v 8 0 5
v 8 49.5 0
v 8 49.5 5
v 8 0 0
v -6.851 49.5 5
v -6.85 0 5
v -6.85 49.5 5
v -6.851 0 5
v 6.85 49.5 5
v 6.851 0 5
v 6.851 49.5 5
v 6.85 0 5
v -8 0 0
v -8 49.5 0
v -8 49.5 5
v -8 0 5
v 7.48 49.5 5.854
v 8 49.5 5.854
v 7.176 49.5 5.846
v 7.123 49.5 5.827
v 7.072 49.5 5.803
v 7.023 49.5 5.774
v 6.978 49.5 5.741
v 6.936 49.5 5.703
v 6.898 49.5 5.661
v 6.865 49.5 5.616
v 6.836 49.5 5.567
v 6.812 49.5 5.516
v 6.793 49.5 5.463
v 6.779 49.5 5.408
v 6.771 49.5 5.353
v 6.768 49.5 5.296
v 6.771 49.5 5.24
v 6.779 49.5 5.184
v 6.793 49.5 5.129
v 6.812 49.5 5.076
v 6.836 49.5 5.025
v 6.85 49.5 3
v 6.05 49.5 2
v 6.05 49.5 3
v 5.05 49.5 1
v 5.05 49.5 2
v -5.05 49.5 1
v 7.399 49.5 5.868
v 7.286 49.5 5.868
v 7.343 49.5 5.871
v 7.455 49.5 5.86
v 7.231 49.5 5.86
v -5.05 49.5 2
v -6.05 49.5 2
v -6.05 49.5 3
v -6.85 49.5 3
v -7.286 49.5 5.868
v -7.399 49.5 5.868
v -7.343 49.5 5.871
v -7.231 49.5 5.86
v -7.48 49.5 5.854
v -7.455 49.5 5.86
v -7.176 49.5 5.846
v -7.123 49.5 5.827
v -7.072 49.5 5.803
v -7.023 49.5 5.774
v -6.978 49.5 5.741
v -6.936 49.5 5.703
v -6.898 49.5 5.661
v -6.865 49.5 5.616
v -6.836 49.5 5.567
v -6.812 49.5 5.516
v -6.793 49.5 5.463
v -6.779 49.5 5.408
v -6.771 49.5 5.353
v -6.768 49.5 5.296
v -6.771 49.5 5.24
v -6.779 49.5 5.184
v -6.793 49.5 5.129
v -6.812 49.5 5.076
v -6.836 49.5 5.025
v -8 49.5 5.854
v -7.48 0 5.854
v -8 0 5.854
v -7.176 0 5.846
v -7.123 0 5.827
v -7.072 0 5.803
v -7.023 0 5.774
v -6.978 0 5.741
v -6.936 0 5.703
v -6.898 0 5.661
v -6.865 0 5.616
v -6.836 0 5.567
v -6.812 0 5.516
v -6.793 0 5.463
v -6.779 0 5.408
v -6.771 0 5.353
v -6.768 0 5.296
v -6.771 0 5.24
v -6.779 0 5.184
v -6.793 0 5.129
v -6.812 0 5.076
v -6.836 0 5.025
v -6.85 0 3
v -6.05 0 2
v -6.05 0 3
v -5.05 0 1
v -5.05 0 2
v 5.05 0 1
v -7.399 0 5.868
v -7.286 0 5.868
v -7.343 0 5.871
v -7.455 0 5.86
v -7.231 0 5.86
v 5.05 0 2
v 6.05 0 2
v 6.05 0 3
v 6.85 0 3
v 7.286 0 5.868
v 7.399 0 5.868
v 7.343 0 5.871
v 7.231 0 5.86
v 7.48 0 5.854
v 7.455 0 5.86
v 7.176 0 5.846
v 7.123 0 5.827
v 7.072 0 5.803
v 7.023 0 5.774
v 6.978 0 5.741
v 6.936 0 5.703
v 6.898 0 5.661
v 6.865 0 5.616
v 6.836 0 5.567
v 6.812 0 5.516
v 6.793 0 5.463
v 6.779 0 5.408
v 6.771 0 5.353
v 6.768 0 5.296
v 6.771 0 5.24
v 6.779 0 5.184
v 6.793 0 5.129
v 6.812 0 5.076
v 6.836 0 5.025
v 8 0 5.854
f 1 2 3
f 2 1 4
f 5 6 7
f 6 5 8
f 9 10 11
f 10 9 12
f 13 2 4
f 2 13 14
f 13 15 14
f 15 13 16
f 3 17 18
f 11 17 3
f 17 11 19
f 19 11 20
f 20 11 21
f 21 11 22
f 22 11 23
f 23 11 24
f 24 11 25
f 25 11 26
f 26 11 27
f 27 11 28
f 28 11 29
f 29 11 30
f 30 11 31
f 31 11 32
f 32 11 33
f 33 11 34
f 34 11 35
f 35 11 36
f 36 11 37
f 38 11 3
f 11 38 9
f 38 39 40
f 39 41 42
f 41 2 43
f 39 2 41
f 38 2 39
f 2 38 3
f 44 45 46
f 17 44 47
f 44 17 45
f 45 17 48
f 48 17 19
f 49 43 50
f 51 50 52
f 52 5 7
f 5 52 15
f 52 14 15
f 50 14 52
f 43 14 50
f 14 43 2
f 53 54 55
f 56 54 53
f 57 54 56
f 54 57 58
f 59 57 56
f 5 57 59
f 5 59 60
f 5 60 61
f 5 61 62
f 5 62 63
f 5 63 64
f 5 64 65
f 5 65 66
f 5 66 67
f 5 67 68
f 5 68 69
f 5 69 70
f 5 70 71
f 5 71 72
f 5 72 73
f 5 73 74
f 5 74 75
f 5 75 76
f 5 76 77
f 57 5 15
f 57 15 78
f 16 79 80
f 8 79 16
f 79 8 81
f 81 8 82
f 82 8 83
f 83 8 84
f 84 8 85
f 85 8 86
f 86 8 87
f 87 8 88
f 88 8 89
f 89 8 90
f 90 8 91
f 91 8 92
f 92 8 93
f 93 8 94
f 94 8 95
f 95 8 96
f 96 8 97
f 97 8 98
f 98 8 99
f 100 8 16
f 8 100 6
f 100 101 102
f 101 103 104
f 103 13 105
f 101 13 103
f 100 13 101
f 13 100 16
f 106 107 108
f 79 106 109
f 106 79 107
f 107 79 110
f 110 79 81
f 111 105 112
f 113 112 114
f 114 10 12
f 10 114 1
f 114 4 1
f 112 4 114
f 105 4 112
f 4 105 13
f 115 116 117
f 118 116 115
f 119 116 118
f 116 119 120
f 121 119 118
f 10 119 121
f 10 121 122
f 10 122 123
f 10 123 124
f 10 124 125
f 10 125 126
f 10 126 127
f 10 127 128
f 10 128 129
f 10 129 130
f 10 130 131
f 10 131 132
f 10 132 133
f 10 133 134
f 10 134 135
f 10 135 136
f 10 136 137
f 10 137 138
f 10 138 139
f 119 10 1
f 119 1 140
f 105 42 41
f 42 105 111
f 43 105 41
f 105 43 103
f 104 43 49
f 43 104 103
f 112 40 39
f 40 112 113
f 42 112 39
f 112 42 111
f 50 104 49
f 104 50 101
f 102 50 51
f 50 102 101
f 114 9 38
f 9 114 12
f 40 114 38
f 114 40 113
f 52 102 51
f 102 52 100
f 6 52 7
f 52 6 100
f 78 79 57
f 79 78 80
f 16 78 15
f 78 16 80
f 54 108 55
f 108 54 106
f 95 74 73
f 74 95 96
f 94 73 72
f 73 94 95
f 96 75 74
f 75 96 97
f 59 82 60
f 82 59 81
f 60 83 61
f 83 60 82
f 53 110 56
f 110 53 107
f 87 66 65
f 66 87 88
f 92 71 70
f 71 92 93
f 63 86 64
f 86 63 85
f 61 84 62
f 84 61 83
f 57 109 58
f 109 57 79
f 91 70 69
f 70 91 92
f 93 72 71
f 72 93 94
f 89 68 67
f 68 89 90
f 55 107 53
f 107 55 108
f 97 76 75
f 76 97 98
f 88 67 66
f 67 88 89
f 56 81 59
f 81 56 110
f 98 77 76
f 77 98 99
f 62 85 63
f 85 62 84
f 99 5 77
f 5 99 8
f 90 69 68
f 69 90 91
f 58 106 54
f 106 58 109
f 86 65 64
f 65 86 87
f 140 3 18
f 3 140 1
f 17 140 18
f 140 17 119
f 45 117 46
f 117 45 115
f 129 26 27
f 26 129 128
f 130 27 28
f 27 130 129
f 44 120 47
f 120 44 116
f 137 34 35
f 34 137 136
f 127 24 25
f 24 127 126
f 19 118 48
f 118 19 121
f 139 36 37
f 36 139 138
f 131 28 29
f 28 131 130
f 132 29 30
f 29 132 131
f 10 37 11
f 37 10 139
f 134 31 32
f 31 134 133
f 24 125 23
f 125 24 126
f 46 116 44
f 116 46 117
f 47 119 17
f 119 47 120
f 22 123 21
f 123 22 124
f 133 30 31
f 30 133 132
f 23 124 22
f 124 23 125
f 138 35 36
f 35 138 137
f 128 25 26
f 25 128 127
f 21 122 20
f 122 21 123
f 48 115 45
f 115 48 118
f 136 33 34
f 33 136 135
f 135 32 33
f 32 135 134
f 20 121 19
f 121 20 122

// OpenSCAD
// file: common.scad
function mm2inches(mm) = mm/25.4;
function inches2mm(inches) = inches*25.4;

function circle_midpoint_by_three_points(A, B, C) =
let (
  yD_b = C.y - B.y,  xD_b = C.x - B.x,  yD_a = B.y - A.y,
  xD_a = B.x - A.x,  aS = yD_a / xD_a,  bS = yD_b / xD_b,
  cex = (aS * bS * (A.y - C.y) + 
  bS * (A.x + B.x) -    aS * (B.x + C.x)) / (2 * (bS - aS)),
  cey = -1 * (cex - (A.x + B.x) / 2) / aS + (A.y + B.y) / 2
)
[cex, cey];

function distance(a, b) = sqrt( (a[0] - b[0])*(a[0] - b[0]) +
                                (a[1] - b[1])*(a[1] - b[1]) +
                                (a[2] - b[2])*(a[2] - b[2]) );

function distance2d(a, b) = sqrt( (a[0] - b[0])*(a[0] - b[0]) +
                                (a[1] - b[1])*(a[1] - b[1])  );
                                
function radius_by_three_points(A, B, C) =
    let (
        center = circle_midpoint_by_three_points( A, B, C ),
        radius = distance2d( A, center )
    ) radius;


function tval( tag, data ) = data[ search([tag],data,num_returns_per_match=1)[0]][1];
function tcontains( tag, data ) =  len( search([tag],data,num_returns_per_match=0) [0] );

function tmerge( la, lb ) = concat( [ for( v = la ) if( ! tcontains( v[0], lb ) ) v ],  lb );
    
function tadd( settings, tag, val ) = tmerge( settings, [ [tag,val] ]  );        

function tdval( tag,  default_val, data ) = ( tval(tag,data)  == undef ) ? default_val : tval(tag,data) ;


function  default_settings( lb ) = tmerge( [
        
        ["led_length", 4.91 ],          // outer dimension of LED along strip

        ["led_width",  4.91 ],          // outer dimension of LED across strip


        ["led_spacing",  49.5 / 7  ],  // 55 / 8; // distance from START of an led to START of next led (not the gap between)

        ["led_overhang",  1 ],
        ["shroud_height",   2 ],

        ["led_inner_width",  4.0 ], // width of the inner circle
        
    ], lb );
// main file
use <common.scad>;

$fn=77;

strip_settings = default_settings( [
        // [ "tag", val ],                      //  measured GW part  / measured printed
        

        ["led_spacing",  49.5 / 7  ],  // 55 / 8; // distance from START of an led to START of next led (not the gap between)

        ["led_overhang",  1 ],
        ["shroud_height",   2 ],

        ["led_inner_width",  4.0 ], // width of the inner circle
        
        ] ) ;


cs1 = default_settings( [
        // [ "tag", val ],                      //  measured GW part  / measured printed
        
        ["led_length", 5.0 ],          // outer dimension of LED along strip
        ["led_width",  5.0 ],          // outer dimension of LED across strip
        
        ["led_spacing",  49.5 / 7  ],  // 55 / 8; // distance from START of an led to START of next led (not the gap between)

        ["led_overhang",  1 ],
        ["shroud_height",   2 ],

        ["led_inner_width",  4.0 ], // width of the inner circle
        
        ["strip_width",   12.1 ],  // outer width of strip
        ["sw_instep",   -1 ],  // 
        ["sw_outstep",   0.8 ],  // outer width of inserts
        ["channel_width",   16 ],  // outer width of channel
        ["channel_depth",   5 ],  
        ["channel_d_bottom",   1 ],           // height of channel bottom
        ["channel_d_strip",   2 ],           // height of channel strip ledge 
        ["channel_d_insert",   3 ],           // height of channel insert ledge
        ] ) ;
        
        
function tadd( settings, tag, val ) = tmerge( settings, [ [tag,val] ]  );        

function cs_fill( settings ) = 
    let(  gap = tval( "led_spacing", settings ) - tval( "led_length", settings )  )
        tmerge( settings, [
                        [ "outer_width", tval( "led_width", settings ) * 1.5 ],
                        [ "gap", gap ],
                        ["outer_length",  tval( "led_length", settings )+ gap  ],
                ]  );        
        
channel_settings = cs_fill(   cs1 );
            
  echo( "channel_settings : ", channel_settings );
    
// fiber_diameter
fiber_diameter = 2.0;
fiber_shoulder = 2.0;


test_holes = [
    [ fiber_diameter, fiber_shoulder, 0, 0, 0 ],
    [ 0.75, fiber_shoulder, 1.4, 0, 0 ],
    [ 0.75, fiber_shoulder, 0.3, 90, 15 ],
];

big_hole = [
    [ fiber_diameter, fiber_shoulder, 0, 0, 0 ],
];

big_holes = [
    [ fiber_diameter, fiber_shoulder, 0, 0, 30 ],
    [ fiber_diameter, fiber_shoulder, 0, 120, 30 ],
    [ fiber_diameter, fiber_shoulder, 0, 240, 30 ],
];


bh2_offset = fiber_diameter *0.58;
big_holes2 = [
    [ fiber_diameter*0.9, fiber_shoulder, 0, 0, 0 ],
    [ fiber_diameter, fiber_shoulder, bh2_offset, 0, 0 ],
    [ fiber_diameter, fiber_shoulder, bh2_offset, 120,  0 ],
    [ fiber_diameter, fiber_shoulder, bh2_offset, 240,  0 ],
];
lh_offset = 0.214;
lh_angle = 12;
lh_shoulder = 1.4;
lh_diameter = 0.75;
little_holes = [
    [ lh_diameter, lh_shoulder, lh_offset, 0, lh_angle ],
    [ lh_diameter, lh_shoulder, lh_offset, 90, lh_angle ],
    [ lh_diameter, lh_shoulder, lh_offset, 180, lh_angle ],
    [ lh_diameter, lh_shoulder, lh_offset, 270, lh_angle ],
    
];

strip_holes = [
    test_holes,
    little_holes,
    little_holes,
    big_hole,
    big_holes,
    big_hole,
    little_holes,
    little_holes,
];

// *************************************************************
/* [Hidden] */



$fn = 64;

module make_hole(settings,hole,div) {
        rotate( [0,hole[4],hole[3] ] ) {
            translate( [hole[2], 0, 0 ] ) {
                cylinder( r = hole[0]/div, h = tval("shroud_height", settings) + hole[1] *div);
            }
        }
}

module cover(settings, holes) {
    led_length = tval("led_length",settings);
    led_spacing = tval("led_spacing",settings);
    led_overhang = tval("led_overhang",settings);
    led_width = tval("led_width",settings);
    led_inner_width = tval("led_inner_width",settings);
    shroud_height  = tval("shroud_height",settings);
    
    outer_width = tval("outer_width",settings); // led_width * 1.5;
    gap = tval("gap",settings); // led_spacing - led_length;
    outer_length = tval("outer_length",settings); // led_length+ gap;
    echo(  "outer_width ,gap,outer_length = ", outer_width ,gap,outer_length  );
    
    difference() {
        union() {
            translate( [ -outer_length/2, -outer_width/2, -led_overhang ] ) {
                cube( [ outer_length, outer_width, led_overhang  + shroud_height ] );
            }
            for( hole = holes ) {
                make_hole( settings, hole, 1 );
            }
        }
        
        translate( [ -led_length/2, -led_width/2, -led_overhang ] ) {
            cube( [ led_length, led_width, led_overhang  ] );
        }
        sphere( r = led_inner_width/2 , center=true);
            for( hole = holes ) {
                make_hole( settings, hole, 2 );
            }
    }
    
}

module strip(settings,  strip_holes) {
    led_spacing = tval( "led_spacing", settings );
    led_length = tval("led_length",settings);
    union() {
        echo( "strip count : ",  len(strip_holes), "  led_spacing:", led_spacing , "  led_length:", led_length  );
        for( i = [0:len(strip_holes)-1] ) {
            holes = strip_holes[i];
            translate( [i * led_spacing, 0, 0 ]) {
                cover(settings,holes);   
            }
        }
    }
}

module channel_cover( settings, hole ) {
    channel_width = tval( "channel_width", settings );
    channel_depth = tval( "channel_depth", settings );
    led_spacing = tval( "led_spacing", settings );
    led_overhang = tval("led_overhang", settings);
    width_along_channel = led_spacing  * 0.9;
    led_width = tval("led_width",settings);
    offset = tval("sw_outstep",settings);
    width = tval("strip_width",settings) + offset * 2;
    height = channel_depth - tval( "channel_d_insert", settings );
     difference() 
    {
        union() {
            cover(settings,hole);   
            translate( [ 0,  -led_spacing/2,  -led_overhang ]  )
                difference() {
                    translate( [ -width/2,  0,  0 ]  )
                        cube( [  width, led_spacing,  height ] );
                    translate( [ -led_width /2,  0,  0 ]  )
                        cube( [  led_width , led_spacing,  height ] );
                }
        }
        translate( [ -channel_width/2, -width_along_channel*1.5, -led_overhang ] )                cube( [channel_width,width_along_channel,channel_depth*3] );
        translate( [ -channel_width/2, width_along_channel*0.5, -led_overhang ] )                cube( [channel_width,width_along_channel,channel_depth*3] );
    }
}


module strip_cut(  tag, btag, channel_length, settings ) {
    channel_width = tval( "channel_width", settings );
    channel_depth = tval( "channel_depth", settings );
    offset = tag == 0 ? 0 : tval(tag,settings);
    width = tval("strip_width",settings) + offset * 2;
     translate( [ -width/2,  0,  tval(btag,settings)]  )
                cube( [  width, channel_length,  channel_depth ] );
}
    
module channel( settings, length ) {
    led_spacing = tval( "led_spacing", settings );
    channel_width = tval( "channel_width", settings );
    channel_depth = tval( "channel_depth", settings );

    channel_length = led_spacing * length;
    difference() {
        translate( [ -channel_width/2,0,0 ]  )
                cube( [ channel_width , channel_length,  channel_depth ] );
        strip_cut( "sw_instep",  "channel_d_bottom", channel_length, settings);
        strip_cut( 0,  "channel_d_strip",channel_length, settings);
        strip_cut( "sw_outstep",  "channel_d_insert",channel_length, settings);
    }
    
    lip_r =   (channel_width -  tval( "strip_width",settings)  - tval( "sw_outstep",settings) *2 )  / 4;
    lip_x_offset = lip_r /7;
    lip_z_sa = (lip_r-lip_x_offset )/ lip_r ;
    lip_z_a = asin(lip_z_sa);
    lip_z_offset = cos(lip_z_a) * lip_r;
    //echo( "lip_r = ", lip_r, "  lip_x_offset=", lip_x_offset,"  lip_z_a=", lip_z_a, "   lip_z_sa=", lip_z_sa, "    lip_z_offset=", lip_z_offset );
    //echo( "sin= ", sin( lip_z_a), "cos= ", cos( lip_z_a), "tan= ", tan( lip_z_a));
    //lip = sqrt( lip_r * lip_r * 2 );

    translate(  [ -channel_width/2+ lip_r,0,channel_depth  ]  ) {

        translate(  [ -lip_r,0,-lip_z_offset]  ) cube( [ lip_r, channel_length, lip_r*2] );

        translate(  [ lip_x_offset,0,lip_z_offset  ]  ) {
            rotate( [ -90, 0, 0 ] ) 
                cylinder( r=lip_r, h=channel_length );
        };
    }

    translate(  [  channel_width/2 - lip_r,0,channel_depth  ]  ) {

        translate(  [ 0,0,-lip_z_offset]  ) cube( [ lip_r, channel_length, lip_r*2] );

        translate(  [- lip_x_offset,0,lip_z_offset  ]  ) {
            rotate( [ -90, 0, 0 ] ) 
                cylinder( r=lip_r, h=channel_length );
        };
    }

    // cover(settings,hole);   
}

//strip( strip_settings, strip_holes );
// channel_cover( channel_settings, big_holes2 );

// translate( [(12.1+1.6)/2,-5,0] )  rotate( [-90,0,0] )
channel( channel_settings, 7 );
